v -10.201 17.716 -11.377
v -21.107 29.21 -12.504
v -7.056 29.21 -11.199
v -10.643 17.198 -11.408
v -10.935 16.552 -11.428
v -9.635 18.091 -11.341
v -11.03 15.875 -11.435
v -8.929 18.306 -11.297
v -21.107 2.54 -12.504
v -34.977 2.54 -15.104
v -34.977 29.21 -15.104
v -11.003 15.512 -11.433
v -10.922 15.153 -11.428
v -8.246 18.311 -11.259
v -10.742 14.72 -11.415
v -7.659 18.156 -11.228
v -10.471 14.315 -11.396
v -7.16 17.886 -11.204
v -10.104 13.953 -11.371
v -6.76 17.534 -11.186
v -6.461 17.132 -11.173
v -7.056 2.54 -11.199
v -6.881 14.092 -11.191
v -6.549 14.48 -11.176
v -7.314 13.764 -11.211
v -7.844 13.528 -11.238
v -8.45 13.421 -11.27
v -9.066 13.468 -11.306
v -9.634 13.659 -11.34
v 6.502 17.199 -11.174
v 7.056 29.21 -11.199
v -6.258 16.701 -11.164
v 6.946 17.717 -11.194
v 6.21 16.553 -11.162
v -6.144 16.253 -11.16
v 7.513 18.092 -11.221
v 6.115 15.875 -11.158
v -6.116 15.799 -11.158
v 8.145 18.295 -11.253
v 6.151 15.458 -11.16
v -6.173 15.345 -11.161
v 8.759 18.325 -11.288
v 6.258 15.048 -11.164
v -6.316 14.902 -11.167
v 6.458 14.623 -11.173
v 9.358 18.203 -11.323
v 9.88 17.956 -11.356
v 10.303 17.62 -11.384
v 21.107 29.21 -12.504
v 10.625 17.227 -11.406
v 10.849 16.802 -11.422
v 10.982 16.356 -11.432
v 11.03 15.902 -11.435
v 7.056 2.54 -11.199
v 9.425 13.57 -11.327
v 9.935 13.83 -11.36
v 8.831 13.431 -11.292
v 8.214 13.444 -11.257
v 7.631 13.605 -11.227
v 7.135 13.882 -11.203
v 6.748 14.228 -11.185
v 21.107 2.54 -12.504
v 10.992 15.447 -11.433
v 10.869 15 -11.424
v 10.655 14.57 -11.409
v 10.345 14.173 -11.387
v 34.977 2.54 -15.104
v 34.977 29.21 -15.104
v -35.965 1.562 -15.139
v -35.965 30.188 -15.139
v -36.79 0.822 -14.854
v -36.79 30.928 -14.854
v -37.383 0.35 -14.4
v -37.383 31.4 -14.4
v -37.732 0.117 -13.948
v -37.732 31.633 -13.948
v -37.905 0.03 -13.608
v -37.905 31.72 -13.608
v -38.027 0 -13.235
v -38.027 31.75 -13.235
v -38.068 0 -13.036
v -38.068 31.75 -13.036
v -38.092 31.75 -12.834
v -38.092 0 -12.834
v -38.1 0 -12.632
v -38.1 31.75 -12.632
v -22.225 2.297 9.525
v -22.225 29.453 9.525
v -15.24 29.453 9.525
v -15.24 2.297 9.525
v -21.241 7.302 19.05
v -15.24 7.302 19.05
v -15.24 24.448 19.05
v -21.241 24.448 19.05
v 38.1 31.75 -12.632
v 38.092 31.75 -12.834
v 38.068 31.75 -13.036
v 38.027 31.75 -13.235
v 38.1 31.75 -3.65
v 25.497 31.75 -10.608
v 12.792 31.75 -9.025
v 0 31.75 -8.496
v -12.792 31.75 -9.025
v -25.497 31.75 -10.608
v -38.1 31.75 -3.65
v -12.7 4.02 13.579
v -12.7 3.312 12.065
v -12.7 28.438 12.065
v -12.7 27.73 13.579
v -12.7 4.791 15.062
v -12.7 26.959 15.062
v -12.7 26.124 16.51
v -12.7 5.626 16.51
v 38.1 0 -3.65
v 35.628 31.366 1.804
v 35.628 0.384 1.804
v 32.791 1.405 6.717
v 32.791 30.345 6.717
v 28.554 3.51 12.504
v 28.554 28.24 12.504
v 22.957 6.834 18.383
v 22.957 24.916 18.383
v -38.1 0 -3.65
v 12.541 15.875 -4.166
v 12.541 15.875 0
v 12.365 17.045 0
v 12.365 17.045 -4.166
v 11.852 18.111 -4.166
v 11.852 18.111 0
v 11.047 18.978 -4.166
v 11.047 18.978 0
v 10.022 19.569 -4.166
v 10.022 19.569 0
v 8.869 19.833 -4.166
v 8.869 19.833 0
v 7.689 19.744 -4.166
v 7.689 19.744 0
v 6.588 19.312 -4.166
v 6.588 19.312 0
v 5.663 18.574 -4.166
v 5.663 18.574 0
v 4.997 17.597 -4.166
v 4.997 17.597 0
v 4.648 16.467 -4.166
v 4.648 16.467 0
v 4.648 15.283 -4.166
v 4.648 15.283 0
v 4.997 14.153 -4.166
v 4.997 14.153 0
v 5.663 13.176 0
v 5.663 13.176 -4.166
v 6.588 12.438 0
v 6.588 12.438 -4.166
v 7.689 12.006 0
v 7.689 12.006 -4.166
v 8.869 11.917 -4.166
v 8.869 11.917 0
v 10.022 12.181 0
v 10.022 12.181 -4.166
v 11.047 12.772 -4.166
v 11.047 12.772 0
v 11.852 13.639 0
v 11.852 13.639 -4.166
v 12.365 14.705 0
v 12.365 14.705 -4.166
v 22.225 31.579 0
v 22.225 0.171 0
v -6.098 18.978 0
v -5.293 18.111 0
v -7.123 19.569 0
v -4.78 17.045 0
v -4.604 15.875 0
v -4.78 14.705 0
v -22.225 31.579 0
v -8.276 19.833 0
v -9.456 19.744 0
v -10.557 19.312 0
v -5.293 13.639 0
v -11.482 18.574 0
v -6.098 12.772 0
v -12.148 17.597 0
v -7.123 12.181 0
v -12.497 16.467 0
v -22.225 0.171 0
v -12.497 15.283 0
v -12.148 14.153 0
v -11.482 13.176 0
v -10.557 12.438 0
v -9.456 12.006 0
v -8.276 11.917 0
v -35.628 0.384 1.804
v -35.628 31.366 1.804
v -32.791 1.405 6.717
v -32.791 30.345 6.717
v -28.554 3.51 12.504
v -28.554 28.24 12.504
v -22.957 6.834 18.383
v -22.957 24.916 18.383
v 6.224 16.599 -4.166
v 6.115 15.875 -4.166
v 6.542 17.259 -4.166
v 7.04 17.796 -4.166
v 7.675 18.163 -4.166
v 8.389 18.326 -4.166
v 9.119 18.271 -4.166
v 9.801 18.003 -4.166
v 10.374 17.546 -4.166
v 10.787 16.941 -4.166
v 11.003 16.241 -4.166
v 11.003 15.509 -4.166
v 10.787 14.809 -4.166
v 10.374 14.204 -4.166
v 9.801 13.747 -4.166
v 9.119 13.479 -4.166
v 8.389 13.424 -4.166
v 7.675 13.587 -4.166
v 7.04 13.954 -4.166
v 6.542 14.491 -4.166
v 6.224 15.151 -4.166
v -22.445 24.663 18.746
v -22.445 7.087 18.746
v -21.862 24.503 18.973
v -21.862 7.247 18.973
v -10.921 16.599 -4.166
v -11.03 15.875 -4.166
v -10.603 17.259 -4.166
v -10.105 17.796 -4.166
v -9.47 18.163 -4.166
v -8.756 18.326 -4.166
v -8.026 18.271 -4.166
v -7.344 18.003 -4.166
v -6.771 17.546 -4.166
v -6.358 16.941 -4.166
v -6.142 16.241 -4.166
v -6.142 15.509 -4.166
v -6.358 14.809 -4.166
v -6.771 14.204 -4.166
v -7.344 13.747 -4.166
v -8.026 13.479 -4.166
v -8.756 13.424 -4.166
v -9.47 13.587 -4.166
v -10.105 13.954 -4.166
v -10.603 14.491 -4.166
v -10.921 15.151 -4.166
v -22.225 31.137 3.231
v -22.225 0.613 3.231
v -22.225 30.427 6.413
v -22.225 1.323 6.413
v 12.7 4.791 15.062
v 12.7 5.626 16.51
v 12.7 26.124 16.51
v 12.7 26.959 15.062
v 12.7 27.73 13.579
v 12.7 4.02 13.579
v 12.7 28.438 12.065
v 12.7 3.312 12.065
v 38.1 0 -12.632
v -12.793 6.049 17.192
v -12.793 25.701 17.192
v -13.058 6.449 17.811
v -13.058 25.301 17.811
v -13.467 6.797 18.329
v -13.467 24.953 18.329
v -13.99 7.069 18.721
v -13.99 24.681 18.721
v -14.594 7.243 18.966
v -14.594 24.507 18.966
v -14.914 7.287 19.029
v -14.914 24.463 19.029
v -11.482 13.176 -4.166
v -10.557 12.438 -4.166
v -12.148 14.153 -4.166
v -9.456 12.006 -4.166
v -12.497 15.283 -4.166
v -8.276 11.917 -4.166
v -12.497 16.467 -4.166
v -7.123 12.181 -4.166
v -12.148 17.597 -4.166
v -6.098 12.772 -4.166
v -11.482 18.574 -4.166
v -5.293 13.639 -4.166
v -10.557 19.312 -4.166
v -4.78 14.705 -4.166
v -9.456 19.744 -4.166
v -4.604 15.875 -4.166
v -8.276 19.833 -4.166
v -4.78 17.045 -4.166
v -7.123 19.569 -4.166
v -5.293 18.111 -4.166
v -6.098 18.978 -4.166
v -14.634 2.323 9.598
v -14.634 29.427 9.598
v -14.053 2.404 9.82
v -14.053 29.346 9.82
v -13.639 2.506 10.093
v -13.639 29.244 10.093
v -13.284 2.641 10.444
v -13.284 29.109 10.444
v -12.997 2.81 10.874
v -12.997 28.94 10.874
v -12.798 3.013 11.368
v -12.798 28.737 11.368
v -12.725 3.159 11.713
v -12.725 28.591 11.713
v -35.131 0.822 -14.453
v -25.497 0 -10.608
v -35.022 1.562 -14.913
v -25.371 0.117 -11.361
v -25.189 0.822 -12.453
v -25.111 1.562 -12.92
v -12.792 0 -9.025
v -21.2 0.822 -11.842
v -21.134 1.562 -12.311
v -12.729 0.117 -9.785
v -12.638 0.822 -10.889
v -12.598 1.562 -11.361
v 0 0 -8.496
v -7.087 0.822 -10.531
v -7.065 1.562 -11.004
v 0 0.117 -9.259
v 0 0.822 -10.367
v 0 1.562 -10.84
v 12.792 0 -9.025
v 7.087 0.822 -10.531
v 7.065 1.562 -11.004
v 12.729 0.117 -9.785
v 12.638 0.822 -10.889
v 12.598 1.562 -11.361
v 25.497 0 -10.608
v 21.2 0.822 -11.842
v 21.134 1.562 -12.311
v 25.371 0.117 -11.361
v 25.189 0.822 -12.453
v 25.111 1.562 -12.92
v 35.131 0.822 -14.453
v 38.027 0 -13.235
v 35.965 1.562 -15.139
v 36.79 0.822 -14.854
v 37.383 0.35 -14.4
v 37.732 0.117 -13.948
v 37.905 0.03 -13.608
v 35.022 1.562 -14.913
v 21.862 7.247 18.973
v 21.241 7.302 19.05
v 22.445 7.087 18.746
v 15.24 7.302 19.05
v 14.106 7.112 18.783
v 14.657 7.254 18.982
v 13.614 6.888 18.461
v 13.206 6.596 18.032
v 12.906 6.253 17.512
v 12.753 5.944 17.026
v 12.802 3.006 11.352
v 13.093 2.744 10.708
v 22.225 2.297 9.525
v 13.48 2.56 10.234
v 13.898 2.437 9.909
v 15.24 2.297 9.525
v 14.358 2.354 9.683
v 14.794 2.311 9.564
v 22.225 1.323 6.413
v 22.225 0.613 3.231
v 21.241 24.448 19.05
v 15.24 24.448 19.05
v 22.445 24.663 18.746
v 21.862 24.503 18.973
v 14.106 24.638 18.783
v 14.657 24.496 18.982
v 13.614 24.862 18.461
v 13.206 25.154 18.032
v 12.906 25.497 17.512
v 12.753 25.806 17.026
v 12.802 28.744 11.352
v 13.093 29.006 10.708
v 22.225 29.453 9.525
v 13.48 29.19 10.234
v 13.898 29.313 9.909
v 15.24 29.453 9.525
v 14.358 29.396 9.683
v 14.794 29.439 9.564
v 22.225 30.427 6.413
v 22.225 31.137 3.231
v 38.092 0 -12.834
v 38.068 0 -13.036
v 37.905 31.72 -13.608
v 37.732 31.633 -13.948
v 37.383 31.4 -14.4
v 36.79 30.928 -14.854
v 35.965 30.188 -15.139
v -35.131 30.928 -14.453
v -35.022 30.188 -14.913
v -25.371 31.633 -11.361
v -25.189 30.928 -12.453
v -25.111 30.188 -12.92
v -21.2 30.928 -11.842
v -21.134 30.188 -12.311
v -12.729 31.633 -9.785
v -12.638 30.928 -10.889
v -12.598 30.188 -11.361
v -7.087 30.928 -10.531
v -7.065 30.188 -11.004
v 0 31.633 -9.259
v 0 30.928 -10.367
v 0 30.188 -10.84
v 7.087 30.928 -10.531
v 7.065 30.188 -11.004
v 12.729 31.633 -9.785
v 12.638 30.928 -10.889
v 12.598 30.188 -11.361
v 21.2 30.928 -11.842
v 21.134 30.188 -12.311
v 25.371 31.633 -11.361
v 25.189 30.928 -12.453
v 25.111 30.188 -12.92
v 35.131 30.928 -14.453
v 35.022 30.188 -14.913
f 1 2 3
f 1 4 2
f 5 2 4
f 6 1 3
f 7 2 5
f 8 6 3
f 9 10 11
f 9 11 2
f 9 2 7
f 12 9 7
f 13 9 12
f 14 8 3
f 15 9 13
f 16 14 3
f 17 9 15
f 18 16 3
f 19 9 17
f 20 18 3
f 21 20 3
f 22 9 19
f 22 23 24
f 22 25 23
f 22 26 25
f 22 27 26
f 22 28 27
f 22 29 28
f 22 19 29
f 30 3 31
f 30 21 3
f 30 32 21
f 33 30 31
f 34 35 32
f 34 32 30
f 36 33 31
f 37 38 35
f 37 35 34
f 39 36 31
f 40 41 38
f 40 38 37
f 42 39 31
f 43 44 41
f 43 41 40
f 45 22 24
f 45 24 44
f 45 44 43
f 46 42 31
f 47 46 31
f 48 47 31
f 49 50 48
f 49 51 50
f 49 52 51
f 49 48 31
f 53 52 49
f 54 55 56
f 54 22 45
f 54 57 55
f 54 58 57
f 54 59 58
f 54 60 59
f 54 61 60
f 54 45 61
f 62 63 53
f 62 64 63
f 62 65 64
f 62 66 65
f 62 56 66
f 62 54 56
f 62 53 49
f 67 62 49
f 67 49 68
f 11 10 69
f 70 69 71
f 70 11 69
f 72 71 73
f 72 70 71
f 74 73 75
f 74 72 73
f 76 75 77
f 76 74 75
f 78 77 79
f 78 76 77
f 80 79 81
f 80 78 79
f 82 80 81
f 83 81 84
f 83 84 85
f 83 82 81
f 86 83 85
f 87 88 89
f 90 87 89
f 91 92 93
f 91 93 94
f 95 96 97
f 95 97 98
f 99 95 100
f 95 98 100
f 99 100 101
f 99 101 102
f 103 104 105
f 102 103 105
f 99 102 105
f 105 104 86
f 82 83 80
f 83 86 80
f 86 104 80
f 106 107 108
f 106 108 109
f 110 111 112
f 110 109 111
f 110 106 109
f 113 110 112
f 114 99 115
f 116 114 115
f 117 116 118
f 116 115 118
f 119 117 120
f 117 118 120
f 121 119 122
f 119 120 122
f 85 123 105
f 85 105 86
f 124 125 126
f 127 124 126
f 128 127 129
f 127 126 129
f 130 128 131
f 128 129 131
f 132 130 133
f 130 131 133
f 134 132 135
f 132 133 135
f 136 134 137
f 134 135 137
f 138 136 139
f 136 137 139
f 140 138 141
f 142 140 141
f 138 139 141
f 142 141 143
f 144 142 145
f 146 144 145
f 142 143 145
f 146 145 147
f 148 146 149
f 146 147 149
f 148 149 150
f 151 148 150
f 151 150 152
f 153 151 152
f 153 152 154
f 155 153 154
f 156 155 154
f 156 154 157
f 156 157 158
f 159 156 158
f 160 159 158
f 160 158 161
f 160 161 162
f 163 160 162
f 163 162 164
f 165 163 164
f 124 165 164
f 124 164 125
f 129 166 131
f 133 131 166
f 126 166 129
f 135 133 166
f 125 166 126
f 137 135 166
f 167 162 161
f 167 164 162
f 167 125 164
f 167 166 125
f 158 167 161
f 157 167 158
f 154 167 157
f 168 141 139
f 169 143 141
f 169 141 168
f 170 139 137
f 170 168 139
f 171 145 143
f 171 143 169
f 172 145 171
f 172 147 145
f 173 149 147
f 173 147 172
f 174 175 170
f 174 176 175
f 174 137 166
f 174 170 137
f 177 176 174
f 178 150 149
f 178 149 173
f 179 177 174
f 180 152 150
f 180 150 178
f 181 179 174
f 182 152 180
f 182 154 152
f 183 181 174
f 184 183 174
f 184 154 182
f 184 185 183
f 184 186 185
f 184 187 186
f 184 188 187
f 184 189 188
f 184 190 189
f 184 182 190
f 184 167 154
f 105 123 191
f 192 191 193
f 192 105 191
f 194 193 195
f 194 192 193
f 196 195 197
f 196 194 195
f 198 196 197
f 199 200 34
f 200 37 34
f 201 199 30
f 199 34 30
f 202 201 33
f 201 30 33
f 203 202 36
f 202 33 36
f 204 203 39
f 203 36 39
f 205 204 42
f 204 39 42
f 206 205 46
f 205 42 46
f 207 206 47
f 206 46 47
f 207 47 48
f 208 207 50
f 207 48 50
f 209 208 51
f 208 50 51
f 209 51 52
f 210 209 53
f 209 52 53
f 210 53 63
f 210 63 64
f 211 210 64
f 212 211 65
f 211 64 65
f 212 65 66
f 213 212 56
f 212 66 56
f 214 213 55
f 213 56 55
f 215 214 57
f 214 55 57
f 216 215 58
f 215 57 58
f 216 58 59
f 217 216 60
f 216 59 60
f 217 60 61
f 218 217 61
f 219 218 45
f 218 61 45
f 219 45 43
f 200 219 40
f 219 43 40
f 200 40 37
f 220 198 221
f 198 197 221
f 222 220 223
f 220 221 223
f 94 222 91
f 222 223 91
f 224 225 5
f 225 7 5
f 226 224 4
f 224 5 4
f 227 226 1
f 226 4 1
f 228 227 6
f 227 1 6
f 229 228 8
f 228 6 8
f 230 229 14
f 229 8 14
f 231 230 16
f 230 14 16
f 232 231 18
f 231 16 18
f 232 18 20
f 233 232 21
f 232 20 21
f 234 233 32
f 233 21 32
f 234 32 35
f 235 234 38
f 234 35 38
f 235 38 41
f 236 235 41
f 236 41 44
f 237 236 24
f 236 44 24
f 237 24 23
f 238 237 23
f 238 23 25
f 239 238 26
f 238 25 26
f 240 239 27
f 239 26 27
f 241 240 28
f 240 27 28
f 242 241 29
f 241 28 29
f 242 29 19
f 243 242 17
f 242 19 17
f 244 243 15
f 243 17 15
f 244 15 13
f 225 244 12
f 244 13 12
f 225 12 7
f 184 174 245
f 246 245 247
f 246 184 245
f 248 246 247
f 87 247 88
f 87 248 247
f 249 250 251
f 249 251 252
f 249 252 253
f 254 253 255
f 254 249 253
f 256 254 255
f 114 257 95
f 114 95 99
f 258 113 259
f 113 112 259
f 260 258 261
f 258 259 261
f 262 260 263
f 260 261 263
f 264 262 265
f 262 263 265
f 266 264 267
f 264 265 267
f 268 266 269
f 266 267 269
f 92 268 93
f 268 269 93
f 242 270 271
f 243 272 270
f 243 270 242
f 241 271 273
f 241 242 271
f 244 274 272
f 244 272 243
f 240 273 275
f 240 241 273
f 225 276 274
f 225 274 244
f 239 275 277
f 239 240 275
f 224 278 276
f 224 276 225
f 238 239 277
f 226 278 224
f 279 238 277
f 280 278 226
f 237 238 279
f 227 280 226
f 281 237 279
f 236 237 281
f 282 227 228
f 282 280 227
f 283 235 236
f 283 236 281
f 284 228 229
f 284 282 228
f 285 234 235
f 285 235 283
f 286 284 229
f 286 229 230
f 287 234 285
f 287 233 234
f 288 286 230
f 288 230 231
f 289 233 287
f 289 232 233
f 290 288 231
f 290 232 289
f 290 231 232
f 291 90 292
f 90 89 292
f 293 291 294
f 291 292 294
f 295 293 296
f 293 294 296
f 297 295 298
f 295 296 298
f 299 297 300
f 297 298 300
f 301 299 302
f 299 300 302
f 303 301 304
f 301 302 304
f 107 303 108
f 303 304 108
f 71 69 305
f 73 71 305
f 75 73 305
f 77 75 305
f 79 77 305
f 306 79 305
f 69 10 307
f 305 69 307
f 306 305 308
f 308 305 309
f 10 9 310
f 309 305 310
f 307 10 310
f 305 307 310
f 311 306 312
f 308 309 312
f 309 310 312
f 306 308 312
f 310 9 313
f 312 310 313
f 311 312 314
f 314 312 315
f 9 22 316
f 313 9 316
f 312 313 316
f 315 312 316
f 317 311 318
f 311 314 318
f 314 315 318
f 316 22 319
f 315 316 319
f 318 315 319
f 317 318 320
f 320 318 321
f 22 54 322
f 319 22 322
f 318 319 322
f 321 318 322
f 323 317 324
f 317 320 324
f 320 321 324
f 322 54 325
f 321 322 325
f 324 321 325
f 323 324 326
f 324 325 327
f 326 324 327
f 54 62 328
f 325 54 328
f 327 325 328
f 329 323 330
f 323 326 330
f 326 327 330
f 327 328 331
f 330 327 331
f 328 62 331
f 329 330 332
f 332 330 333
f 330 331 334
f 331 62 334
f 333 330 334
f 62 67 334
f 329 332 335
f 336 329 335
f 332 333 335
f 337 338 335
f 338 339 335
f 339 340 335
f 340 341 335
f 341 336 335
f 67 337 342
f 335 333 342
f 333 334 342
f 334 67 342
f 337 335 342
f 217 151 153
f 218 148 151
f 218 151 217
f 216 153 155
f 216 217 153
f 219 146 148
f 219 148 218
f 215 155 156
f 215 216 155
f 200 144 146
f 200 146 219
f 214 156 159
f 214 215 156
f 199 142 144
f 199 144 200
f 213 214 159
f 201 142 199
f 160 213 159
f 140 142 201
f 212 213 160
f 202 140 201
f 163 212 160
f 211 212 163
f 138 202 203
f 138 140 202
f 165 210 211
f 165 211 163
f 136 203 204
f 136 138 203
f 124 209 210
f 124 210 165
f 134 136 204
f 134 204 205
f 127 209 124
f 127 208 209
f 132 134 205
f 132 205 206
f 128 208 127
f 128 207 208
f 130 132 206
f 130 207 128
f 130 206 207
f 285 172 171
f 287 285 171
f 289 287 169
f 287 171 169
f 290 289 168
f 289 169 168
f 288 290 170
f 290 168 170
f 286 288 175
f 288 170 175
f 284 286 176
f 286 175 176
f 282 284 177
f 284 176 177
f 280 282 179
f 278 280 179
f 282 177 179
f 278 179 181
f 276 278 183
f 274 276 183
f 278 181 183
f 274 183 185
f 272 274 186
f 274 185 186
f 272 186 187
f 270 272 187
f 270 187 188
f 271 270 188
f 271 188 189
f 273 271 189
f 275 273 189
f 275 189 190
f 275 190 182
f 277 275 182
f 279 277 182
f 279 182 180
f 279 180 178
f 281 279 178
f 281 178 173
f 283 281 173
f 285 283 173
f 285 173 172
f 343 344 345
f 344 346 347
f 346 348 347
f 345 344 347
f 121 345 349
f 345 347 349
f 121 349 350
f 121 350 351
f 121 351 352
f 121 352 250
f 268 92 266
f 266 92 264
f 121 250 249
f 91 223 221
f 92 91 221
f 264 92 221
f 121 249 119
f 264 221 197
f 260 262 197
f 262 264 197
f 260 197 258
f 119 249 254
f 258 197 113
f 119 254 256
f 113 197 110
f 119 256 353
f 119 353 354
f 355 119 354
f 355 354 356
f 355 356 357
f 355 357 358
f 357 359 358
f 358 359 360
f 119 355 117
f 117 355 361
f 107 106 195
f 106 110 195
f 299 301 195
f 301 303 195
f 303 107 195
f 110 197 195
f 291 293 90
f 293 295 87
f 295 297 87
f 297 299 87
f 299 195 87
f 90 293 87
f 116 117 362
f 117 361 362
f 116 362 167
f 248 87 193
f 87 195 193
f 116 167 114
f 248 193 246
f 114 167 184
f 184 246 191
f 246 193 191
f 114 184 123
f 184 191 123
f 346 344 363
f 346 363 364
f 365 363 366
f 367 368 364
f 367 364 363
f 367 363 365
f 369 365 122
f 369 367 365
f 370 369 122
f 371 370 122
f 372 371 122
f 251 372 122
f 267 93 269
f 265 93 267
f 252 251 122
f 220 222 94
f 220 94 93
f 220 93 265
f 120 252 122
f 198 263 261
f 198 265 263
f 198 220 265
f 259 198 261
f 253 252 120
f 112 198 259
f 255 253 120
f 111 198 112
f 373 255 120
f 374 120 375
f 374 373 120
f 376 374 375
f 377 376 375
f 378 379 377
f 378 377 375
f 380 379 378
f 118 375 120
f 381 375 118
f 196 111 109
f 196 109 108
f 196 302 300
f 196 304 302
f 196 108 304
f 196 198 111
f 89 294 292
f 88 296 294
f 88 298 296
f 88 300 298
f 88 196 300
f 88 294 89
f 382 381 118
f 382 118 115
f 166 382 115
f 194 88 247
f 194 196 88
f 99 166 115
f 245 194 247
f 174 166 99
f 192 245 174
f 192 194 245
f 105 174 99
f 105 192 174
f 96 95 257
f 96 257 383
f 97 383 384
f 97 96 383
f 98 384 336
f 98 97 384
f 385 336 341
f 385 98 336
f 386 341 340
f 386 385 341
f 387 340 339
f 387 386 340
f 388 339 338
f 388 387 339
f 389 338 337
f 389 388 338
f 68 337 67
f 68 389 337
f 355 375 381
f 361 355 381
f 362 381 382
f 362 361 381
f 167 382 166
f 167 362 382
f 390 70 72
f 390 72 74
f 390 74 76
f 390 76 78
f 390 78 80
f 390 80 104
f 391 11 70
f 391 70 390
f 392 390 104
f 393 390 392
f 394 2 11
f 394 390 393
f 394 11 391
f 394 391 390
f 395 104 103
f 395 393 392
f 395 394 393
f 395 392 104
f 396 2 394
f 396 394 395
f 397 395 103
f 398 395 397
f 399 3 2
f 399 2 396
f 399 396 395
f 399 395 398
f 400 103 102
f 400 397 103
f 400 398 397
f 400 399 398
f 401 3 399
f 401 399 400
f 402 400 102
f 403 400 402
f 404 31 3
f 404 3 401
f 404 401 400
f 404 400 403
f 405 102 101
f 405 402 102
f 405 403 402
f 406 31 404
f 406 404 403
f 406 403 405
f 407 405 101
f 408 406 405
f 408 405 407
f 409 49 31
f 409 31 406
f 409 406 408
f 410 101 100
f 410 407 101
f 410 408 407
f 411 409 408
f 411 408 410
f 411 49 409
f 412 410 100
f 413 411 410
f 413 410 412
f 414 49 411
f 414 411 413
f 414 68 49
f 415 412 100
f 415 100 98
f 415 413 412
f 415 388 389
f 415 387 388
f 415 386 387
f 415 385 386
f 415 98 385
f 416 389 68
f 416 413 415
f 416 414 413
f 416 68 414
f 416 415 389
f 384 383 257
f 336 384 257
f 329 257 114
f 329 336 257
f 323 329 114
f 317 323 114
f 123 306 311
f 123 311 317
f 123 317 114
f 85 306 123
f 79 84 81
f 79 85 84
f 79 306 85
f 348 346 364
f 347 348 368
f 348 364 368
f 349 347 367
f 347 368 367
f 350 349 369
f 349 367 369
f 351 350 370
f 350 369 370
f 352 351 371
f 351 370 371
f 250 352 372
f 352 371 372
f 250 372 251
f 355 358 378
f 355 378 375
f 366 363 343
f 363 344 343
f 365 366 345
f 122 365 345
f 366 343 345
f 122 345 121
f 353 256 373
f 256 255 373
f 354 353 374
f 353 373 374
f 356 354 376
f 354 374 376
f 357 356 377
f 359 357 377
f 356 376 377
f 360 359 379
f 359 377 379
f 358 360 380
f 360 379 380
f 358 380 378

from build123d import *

# Parameters (mm, degrees)
BOSS_EXTRUDE1_DEPTH                            = 31.75
CBORE_FOR_8_SOCKET_HEAD_CAP_SCREW1_D           = 4.9149
CBORE_FOR_8_SOCKET_HEAD_CAP_SCREW1_CBORE_D     = 7.9375
CBORE_FOR_8_SOCKET_HEAD_CAP_SCREW1_CBORE_DEPTH = 4.1656
CUT_EXTRUDE1_DEPTH                             = 32.7500001
CUT_EXTRUDE3_DEPTH                             = 77.2000001
FILLET1_R                                      = 2.54
FILLET2_R                                      = 2.54
FILLET3_R                                      = 2.54


with BuildPart() as part:
    # Sketch1 → Boss-Extrude1 (new body)
    with BuildSketch(Plane(origin=(0, 0, 0), x_dir=(1, 0, 0), z_dir=(0, 1, 0))):
        with BuildLine():
            Line((38.1, 15.875), (38.1, -19.05))
            Line((38.1, -19.05), (12.7, -19.05))
            Line((12.7, -19.05), (12.7, -9.525))
            Line((12.7, -9.525), (22.225, -9.525))
            Line((22.225, -9.525), (22.225, 0))
            Line((22.225, 0), (-22.225, 0))
            Line((-22.225, 0), (-22.225, -9.525))
            Line((-22.225, -9.525), (-12.7, -9.525))
            Line((-12.7, -9.525), (-12.7, -19.05))
            Line((-12.7, -19.05), (-38.1, -19.05))
            Line((-38.1, -19.05), (-38.1, 15.875))
            ThreePointArc((-38.1, 15.875), (0, 11.035665491), (38.1, 15.875))
        make_face()
    extrude(amount=BOSS_EXTRUDE1_DEPTH)

    # CBORE for #8 Socket Head Cap Screw1 (through all)
    with Locations(Plane.XY):
        with Locations((-8.5725, 15.875), (8.5725, 15.875)):
            CounterBoreHole(CBORE_FOR_8_SOCKET_HEAD_CAP_SCREW1_D / 2, CBORE_FOR_8_SOCKET_HEAD_CAP_SCREW1_CBORE_D / 2, CBORE_FOR_8_SOCKET_HEAD_CAP_SCREW1_CBORE_DEPTH)

    # Sketch4 → Cut-Extrude1 (cut, through all)
    with BuildSketch(Plane(origin=(0, 31.75, 0), x_dir=(1, 0, 0), z_dir=(0, 1, 0))):
        with BuildLine():
            Line((-38.1, -19.05), (-38.1, 3.649511931))
            ThreePointArc((-38.1, 3.649511931), (-31.500580819, -8.639700689), (-22.216037286, -19.05))
            Line((-22.216037286, -19.05), (-38.1, -19.05))
        make_face()
    cut_extrude1 = extrude(amount=-CUT_EXTRUDE1_DEPTH, mode=Mode.SUBTRACT)

    # Mirror1: Cut-Extrude1 across plane
    add(cut_extrude1.mirror(Plane(origin=(0, 0, 0), x_dir=(0, 0, 1), z_dir=(1, 0, 0))), mode=Mode.SUBTRACT)

    # Sketch5 → Cut-Extrude3 (cut, through all)
    with BuildSketch(Plane.ZY.offset(38.1)):
        with BuildLine():
            Line((-3.649511931, 31.75), (19.05, 31.75))
            Line((19.05, 31.75), (19.05, 24.4475))
            ThreePointArc((19.05, 24.4475), (8.273096301, 29.879437004), (-3.649511931, 31.75))
        make_face()
        with BuildLine():
            ThreePointArc((19.05, 7.3025), (8.273096301, 1.870562996), (-3.649511931, 0))
            Line((-3.649511931, 0), (19.05, 0))
            Line((19.05, 0), (19.05, 7.3025))
        make_face()
    extrude(amount=-CUT_EXTRUDE3_DEPTH, mode=Mode.SUBTRACT)

    # Fillet1
    fillet1_edges = [part.edges().sort_by_distance(p)[0] for p in [
        (0, 0, -11.035665491),
        (38.1, 15.875, -15.875),
        (-38.1, 15.875, -15.875),
        (0, 31.75, -11.035665491),
    ]]
    fillet(fillet1_edges, radius=FILLET1_R)

    # Fillet2
    fillet2_edges = [part.edges().sort_by_distance(p)[0] for p in [
        (12.7, 15.875, 19.05),
        (12.7, 15.875, 9.525),
        (-12.7, 15.875, 9.525),
        (-12.7, 15.875, 19.05),
    ]]
    fillet(fillet2_edges, radius=FILLET2_R)

    # Fillet3
    fillet3_edges = [part.edges().sort_by_distance(p)[0] for p in [
        (22.216037286, 15.875, 19.05),
        (-22.216037286, 15.875, 19.05),
    ]]
    fillet(fillet3_edges, radius=FILLET3_R)


solid = part.part
